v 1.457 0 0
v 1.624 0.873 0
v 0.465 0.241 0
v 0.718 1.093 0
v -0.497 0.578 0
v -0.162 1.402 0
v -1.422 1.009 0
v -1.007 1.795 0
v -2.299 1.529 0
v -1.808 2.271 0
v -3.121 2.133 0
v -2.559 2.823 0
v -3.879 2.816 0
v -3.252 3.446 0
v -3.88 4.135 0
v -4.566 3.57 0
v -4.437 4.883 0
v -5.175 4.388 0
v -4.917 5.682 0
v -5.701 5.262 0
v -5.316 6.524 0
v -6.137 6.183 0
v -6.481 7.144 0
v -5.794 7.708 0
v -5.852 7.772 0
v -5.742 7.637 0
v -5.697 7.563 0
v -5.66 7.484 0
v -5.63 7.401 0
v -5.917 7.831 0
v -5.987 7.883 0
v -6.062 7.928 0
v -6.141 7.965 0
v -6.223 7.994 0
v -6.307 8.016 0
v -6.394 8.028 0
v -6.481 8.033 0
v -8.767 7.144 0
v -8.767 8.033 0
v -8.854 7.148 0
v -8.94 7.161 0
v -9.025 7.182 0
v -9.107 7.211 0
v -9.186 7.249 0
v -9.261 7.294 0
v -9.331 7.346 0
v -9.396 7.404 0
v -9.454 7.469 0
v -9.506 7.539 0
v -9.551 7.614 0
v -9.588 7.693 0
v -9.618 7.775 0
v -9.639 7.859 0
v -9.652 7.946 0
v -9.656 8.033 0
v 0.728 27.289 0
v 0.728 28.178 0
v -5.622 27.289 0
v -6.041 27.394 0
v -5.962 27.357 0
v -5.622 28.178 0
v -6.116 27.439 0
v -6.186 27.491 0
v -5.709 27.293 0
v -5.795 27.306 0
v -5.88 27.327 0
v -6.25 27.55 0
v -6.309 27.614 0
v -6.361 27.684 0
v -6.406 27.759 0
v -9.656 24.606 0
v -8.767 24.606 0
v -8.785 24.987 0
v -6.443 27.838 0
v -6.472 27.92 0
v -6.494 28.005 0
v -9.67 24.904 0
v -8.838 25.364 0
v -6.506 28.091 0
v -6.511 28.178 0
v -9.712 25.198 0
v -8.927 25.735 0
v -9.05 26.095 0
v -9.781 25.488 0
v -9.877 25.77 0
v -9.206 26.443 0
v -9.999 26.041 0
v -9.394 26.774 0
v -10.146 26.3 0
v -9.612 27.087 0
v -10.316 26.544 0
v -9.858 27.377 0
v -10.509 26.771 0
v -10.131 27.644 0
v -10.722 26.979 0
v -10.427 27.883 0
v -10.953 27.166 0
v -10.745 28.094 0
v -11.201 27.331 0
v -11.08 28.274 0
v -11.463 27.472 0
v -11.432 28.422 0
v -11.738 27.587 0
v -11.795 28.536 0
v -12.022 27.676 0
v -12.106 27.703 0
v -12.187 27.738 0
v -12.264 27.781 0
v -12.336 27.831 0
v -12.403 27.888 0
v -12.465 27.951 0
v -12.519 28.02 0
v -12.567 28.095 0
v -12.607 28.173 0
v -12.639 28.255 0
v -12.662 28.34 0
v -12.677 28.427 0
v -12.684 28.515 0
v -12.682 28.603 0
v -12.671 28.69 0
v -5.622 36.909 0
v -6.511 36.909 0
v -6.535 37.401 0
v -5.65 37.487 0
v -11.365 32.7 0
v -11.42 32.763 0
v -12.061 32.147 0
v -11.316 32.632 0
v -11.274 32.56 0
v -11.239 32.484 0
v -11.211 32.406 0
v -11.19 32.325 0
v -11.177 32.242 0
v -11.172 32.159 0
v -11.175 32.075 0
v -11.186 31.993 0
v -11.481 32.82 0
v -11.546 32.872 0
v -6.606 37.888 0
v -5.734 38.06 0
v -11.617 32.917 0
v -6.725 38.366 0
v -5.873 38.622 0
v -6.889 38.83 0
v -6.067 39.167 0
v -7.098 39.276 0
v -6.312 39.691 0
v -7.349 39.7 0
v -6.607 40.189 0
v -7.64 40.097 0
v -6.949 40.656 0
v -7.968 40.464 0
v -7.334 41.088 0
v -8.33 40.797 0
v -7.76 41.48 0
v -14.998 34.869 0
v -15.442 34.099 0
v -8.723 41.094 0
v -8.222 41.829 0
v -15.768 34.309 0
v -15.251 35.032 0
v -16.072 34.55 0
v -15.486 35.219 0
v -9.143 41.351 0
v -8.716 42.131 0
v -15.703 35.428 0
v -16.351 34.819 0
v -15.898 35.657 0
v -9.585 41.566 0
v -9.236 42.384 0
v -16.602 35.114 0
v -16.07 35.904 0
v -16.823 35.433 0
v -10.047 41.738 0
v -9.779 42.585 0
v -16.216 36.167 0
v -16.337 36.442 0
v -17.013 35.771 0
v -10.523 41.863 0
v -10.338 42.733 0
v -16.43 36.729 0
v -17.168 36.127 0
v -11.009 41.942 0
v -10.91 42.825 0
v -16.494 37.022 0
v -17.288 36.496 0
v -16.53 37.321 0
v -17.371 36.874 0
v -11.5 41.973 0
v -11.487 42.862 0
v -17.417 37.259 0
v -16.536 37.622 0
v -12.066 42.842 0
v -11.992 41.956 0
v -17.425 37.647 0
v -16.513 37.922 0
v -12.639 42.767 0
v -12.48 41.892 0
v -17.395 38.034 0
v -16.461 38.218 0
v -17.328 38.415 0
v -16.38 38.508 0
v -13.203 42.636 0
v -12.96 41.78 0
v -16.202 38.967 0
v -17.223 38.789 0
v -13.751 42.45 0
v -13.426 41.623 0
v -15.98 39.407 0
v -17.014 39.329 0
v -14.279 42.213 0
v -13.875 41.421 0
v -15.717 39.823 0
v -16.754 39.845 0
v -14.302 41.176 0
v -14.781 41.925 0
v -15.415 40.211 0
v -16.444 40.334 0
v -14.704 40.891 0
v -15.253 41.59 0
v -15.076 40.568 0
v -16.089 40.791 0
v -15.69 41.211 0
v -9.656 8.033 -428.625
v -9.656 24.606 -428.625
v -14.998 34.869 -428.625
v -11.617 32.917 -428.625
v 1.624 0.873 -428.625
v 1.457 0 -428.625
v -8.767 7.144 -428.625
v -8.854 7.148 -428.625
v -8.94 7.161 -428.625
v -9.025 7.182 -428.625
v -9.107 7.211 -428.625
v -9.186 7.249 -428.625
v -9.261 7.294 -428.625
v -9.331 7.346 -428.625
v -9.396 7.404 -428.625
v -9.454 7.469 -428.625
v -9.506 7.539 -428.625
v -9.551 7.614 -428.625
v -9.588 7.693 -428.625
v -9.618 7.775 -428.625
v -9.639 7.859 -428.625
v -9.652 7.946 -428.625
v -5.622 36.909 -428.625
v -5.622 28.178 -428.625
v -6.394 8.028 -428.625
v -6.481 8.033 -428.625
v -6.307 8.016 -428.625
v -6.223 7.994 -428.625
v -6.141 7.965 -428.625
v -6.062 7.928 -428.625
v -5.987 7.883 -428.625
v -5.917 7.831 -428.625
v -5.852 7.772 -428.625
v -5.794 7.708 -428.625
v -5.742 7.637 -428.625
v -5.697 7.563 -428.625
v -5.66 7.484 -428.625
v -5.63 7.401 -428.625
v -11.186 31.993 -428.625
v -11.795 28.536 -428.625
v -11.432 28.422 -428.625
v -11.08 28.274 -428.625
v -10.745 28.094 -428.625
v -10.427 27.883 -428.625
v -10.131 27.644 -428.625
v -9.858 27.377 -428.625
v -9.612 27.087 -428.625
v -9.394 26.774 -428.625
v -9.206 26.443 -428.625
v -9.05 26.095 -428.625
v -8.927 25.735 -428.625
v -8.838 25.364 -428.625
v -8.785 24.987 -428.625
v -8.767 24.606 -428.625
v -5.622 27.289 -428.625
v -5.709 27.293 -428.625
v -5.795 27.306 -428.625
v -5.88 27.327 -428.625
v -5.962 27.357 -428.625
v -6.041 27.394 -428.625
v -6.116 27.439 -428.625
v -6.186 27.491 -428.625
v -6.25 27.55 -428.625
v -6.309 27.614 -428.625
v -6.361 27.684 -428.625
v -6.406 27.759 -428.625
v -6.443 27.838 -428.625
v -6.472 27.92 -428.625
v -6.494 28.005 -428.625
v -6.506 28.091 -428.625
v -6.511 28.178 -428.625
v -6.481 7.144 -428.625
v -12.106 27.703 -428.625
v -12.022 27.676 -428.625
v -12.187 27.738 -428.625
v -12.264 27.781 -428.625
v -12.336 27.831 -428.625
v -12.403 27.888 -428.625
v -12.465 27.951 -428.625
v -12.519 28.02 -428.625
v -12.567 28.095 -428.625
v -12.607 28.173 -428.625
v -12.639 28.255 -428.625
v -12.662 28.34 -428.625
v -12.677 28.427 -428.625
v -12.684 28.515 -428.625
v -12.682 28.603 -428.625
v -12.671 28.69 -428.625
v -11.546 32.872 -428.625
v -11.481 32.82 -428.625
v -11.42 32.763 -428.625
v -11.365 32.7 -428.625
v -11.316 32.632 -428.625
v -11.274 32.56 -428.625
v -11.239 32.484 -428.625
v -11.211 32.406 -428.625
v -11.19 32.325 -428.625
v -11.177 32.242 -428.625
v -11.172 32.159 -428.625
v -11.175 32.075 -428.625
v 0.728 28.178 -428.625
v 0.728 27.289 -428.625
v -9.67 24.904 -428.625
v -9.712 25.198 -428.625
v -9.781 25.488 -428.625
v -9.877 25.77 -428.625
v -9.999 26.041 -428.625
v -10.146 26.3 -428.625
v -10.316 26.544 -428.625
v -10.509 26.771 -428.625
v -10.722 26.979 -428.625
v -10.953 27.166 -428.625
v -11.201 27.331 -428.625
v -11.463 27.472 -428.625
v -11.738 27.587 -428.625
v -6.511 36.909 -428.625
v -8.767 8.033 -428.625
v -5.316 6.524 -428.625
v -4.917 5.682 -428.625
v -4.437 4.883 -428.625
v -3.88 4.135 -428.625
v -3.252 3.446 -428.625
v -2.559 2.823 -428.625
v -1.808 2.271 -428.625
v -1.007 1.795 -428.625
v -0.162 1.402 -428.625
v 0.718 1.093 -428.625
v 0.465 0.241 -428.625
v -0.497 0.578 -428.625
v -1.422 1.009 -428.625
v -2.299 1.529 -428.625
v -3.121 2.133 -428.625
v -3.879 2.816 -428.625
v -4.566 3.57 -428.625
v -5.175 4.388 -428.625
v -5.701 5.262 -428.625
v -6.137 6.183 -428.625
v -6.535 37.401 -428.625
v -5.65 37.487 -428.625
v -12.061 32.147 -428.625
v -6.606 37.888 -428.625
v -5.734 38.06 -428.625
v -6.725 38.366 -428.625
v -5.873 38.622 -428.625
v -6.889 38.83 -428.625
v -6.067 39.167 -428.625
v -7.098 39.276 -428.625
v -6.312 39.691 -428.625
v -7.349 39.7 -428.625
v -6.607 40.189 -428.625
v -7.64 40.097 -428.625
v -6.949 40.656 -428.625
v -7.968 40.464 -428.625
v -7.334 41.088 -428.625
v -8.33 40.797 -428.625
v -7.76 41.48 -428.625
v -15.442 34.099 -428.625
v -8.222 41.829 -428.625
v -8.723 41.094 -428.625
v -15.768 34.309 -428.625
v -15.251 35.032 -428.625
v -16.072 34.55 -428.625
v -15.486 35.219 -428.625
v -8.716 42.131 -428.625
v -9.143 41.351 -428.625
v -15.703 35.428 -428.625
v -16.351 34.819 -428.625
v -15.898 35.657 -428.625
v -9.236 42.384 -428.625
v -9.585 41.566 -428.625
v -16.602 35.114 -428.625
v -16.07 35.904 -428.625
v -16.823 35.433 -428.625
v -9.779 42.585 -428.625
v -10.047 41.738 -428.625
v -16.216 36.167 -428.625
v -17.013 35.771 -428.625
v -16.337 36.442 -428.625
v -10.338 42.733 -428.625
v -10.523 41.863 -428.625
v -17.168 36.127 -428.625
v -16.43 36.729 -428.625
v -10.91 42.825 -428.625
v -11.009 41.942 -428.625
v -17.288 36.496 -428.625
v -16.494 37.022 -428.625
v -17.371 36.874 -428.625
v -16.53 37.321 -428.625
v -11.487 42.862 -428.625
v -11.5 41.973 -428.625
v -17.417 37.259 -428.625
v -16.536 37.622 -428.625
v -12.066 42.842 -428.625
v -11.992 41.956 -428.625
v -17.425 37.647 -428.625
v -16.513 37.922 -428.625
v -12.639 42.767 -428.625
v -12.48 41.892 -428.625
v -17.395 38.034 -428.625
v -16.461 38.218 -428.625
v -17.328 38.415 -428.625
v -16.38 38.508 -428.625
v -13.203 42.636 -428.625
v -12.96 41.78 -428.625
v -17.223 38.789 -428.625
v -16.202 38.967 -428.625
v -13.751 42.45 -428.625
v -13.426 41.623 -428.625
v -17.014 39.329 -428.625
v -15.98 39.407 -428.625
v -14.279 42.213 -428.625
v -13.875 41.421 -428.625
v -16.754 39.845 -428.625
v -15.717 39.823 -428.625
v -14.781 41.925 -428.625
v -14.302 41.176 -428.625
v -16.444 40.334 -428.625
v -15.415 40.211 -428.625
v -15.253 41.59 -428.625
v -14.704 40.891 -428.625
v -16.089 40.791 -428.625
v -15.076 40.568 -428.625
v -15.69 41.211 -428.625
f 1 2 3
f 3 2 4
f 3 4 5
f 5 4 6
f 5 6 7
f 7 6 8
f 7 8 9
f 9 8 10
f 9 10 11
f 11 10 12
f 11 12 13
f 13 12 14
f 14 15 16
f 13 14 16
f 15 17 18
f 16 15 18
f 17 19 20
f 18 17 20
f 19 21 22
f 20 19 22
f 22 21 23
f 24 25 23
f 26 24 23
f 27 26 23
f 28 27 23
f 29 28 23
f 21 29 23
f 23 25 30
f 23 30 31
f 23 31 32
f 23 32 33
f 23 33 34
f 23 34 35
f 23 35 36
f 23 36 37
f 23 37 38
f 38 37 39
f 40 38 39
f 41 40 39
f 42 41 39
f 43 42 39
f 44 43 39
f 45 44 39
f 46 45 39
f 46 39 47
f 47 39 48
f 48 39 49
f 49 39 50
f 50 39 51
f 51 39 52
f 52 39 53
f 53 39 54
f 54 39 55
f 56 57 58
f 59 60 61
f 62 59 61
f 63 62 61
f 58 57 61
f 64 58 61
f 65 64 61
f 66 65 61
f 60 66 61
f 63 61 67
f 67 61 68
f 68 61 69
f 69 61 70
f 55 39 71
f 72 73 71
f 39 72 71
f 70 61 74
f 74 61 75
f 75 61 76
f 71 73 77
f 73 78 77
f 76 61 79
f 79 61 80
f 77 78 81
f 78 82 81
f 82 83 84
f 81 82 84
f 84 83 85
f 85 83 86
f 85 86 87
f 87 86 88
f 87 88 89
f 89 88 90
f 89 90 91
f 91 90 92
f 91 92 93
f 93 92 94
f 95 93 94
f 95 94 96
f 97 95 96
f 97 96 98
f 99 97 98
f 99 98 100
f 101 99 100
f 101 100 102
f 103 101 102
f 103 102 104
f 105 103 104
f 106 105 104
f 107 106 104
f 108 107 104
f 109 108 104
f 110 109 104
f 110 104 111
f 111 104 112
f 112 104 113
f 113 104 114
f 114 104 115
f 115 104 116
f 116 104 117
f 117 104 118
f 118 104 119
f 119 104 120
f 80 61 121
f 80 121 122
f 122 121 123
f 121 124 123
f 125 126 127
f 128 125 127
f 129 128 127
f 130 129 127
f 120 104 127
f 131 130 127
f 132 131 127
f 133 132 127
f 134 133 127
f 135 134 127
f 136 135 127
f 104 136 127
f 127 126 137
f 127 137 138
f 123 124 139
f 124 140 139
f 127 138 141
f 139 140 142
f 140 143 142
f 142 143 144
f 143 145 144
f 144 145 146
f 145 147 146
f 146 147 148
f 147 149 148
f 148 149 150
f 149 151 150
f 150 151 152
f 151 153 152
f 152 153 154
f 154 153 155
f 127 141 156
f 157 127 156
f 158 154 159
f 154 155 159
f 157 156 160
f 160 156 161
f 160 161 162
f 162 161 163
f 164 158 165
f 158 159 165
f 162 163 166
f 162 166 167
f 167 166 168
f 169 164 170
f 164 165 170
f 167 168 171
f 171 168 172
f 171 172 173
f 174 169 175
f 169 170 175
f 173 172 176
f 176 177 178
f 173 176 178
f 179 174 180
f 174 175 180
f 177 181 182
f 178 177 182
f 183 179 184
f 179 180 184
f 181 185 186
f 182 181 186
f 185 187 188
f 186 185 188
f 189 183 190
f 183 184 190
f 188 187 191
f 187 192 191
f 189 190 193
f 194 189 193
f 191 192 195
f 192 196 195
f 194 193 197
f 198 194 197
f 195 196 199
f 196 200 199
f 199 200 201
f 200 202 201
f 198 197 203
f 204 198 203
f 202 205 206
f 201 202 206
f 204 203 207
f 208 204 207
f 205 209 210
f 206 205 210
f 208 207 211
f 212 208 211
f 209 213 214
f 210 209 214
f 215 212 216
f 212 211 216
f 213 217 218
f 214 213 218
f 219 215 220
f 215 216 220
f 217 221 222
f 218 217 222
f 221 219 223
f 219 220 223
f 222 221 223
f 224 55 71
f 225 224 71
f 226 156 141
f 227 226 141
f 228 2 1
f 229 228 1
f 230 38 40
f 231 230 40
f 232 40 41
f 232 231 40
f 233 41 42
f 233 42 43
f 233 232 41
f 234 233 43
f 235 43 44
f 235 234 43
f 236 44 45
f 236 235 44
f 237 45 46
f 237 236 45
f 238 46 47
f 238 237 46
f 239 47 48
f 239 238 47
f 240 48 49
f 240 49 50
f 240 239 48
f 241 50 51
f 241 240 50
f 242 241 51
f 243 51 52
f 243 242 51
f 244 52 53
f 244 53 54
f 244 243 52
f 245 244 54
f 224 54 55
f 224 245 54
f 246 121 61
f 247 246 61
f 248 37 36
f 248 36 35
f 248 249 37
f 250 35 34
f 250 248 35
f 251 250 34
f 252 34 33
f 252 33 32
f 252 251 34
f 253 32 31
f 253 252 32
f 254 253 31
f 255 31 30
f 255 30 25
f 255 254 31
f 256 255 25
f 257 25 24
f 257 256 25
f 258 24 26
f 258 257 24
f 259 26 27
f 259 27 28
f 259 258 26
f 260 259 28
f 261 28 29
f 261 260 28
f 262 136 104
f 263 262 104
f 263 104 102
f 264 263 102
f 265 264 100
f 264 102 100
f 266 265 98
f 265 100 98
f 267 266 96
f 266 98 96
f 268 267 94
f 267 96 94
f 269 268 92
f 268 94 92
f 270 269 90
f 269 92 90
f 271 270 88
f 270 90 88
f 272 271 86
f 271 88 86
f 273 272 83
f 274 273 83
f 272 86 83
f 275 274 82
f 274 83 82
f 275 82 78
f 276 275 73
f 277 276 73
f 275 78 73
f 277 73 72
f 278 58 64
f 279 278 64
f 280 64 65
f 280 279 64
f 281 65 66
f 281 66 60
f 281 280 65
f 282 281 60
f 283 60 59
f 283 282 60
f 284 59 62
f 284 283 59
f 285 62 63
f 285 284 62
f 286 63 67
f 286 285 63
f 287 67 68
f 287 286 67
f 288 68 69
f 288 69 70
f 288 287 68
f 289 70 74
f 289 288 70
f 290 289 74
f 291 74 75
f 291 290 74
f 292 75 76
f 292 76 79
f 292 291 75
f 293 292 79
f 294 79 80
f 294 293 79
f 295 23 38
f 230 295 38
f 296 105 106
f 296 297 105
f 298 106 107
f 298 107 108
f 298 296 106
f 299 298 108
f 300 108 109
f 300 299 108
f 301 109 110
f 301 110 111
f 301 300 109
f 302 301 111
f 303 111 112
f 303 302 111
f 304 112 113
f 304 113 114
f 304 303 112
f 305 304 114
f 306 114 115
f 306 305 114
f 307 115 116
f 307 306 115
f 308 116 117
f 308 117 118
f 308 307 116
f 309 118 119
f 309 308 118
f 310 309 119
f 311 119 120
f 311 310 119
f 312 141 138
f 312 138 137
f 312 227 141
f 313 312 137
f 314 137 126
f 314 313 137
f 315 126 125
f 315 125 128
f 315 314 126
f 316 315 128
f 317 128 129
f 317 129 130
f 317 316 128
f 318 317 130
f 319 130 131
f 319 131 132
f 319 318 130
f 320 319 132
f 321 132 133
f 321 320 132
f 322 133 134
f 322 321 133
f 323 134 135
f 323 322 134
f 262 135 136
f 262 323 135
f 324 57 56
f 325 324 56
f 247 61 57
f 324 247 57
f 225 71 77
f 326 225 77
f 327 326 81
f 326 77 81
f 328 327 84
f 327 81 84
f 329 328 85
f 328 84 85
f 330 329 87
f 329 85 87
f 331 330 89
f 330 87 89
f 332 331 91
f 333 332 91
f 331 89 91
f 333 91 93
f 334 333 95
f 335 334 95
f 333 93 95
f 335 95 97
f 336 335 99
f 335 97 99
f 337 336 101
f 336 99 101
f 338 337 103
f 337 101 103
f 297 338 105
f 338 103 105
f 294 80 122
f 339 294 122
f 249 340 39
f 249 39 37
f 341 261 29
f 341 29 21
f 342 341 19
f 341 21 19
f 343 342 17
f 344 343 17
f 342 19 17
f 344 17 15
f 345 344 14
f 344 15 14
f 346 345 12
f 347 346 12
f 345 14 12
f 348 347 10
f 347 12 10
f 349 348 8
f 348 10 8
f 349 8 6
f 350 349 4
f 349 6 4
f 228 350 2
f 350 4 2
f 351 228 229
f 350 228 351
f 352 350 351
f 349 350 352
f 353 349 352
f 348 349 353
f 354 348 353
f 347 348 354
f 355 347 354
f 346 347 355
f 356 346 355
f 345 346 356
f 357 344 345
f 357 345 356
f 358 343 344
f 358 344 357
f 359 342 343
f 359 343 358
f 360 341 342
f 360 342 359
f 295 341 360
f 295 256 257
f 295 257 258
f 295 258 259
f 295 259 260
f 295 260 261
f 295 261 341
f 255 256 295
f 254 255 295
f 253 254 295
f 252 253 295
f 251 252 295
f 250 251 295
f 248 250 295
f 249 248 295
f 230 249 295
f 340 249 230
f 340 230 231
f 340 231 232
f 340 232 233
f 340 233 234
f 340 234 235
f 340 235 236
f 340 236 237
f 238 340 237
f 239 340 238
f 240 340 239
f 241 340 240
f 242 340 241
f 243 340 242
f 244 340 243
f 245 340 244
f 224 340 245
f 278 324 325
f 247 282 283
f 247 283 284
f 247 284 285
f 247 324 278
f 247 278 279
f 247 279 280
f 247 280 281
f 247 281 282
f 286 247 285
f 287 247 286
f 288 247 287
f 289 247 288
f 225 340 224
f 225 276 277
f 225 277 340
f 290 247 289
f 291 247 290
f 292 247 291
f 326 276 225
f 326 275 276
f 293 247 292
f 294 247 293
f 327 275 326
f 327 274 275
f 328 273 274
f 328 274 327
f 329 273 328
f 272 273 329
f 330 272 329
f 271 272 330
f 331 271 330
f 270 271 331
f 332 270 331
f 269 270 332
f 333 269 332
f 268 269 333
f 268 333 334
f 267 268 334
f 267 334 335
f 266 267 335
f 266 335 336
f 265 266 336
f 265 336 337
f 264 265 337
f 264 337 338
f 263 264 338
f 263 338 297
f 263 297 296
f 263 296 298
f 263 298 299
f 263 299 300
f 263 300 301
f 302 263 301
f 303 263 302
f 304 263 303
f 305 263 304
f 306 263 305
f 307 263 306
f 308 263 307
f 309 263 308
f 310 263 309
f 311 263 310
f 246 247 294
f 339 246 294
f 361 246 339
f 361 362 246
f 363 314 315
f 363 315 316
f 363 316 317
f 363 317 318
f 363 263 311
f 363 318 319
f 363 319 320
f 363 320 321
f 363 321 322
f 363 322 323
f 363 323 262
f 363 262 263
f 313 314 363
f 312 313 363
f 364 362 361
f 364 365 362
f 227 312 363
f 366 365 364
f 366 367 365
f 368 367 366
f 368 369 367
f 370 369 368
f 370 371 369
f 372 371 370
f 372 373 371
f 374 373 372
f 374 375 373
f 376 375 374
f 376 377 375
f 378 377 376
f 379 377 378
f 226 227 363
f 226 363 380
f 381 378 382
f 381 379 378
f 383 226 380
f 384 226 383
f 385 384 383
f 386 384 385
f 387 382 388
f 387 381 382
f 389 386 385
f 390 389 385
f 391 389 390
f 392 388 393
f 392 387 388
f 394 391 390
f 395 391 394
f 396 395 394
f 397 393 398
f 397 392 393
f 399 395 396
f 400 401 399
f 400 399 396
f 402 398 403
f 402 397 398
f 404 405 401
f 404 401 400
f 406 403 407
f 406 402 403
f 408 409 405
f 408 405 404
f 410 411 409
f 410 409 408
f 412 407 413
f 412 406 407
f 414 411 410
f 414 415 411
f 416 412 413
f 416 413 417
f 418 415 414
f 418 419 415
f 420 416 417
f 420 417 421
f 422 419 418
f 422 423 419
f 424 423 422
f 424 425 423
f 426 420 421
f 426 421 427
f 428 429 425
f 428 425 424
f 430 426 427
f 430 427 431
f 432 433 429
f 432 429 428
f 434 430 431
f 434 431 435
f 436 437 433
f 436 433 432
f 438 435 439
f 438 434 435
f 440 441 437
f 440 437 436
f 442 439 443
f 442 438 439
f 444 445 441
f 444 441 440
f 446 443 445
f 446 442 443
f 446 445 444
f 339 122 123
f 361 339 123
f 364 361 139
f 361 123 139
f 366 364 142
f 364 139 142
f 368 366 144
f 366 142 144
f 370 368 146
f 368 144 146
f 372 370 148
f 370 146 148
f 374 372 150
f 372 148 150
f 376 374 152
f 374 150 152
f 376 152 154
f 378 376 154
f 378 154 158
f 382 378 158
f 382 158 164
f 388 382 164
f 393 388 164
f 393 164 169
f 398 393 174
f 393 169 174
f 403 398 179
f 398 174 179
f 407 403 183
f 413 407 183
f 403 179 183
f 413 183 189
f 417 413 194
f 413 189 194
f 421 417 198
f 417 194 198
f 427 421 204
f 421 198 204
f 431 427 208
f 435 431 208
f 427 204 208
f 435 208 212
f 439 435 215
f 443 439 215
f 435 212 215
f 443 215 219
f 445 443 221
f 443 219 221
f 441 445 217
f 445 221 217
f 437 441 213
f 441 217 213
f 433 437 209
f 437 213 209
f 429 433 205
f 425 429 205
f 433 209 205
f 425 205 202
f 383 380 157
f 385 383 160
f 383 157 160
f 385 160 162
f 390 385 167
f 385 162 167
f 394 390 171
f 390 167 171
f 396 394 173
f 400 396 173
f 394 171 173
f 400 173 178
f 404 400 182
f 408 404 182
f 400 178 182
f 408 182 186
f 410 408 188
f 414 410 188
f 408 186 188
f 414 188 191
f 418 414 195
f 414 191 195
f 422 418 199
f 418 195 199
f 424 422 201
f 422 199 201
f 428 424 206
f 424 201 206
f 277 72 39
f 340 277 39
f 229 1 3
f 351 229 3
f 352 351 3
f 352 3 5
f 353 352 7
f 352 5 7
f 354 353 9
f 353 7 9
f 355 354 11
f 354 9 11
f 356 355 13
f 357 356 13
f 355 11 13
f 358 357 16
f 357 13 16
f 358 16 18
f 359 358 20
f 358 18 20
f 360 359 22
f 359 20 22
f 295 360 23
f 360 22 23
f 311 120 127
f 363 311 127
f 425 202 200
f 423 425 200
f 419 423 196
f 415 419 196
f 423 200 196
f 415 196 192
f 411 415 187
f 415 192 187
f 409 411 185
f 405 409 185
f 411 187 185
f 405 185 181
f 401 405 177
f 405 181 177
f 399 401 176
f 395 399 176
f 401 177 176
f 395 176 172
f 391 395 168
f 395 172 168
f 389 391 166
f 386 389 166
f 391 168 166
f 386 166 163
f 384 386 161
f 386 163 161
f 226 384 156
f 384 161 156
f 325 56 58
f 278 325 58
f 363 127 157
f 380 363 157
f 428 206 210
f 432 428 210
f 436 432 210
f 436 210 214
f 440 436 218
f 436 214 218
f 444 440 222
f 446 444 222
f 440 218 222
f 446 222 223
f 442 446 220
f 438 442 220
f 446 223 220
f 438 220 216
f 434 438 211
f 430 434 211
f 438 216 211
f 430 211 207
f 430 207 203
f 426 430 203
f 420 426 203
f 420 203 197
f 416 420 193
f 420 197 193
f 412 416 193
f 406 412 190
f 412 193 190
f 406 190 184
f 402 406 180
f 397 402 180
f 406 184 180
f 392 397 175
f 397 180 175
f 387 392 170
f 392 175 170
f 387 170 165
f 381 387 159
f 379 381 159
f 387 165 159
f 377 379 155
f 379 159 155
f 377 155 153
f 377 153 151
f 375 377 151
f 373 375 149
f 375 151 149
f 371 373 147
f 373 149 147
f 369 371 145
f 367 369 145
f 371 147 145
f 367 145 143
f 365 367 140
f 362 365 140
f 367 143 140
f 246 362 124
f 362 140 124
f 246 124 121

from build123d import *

# Parameters (mm, degrees)
EXTRUDE_THIN1_DEPTH = 428.625
FILLET1_R           = 0.889


with BuildPart() as part:
    # Sketch1 → Extrude-Thin1 (new body)
    with BuildSketch(Plane.XY):
        with BuildLine():
            ThreePointArc((0, 0), (4.964730566, 2.465229927), (7.9375, 7.14375))
            Line((7.9375, 7.14375), (11.1125, 7.14375))
            Line((11.1125, 7.14375), (11.1125, 24.60625))
            ThreePointArc((11.1125, 24.60625), (12.04243597, 26.85131403), (14.2875, 27.78125))
            Line((14.2875, 27.78125), (13.517722525, 32.146875))
            Line((13.517722525, 32.146875), (16.898645987, 34.098852071))
            ThreePointArc((16.898645987, 34.098852071), (18.624416275, 36.126706761), (18.680023291, 38.788921177))
            ThreePointArc((18.680023291, 38.788921177), (12.079369103, 42.78588283), (7.078269835, 36.909375))
            Line((7.078269835, 36.909375), (7.078269835, 28.178125))
            Line((7.078269835, 28.178125), (0.728269835, 28.178125))
            Line((0.728269835, 28.178125), (0.728269835, 27.289125))
            Line((0.728269835, 27.289125), (7.967269835, 27.289125))
            Line((7.967269835, 27.289125), (7.967269835, 36.909375))
            ThreePointArc((7.967269835, 36.909375), (12.221538279, 41.908324327), (17.836494775, 38.508242281))
            ThreePointArc((17.836494775, 38.508242281), (17.79334373, 36.442363895), (16.454145987, 34.868748655))
            Line((16.454145987, 34.868748655), (12.534135133, 32.605529333))
            Line((12.534135133, 32.605529333), (13.251696834, 28.536034702))
            ThreePointArc((13.251696834, 28.536034702), (11.068369678, 27.086833796), (10.2235, 24.60625))
            Line((10.2235, 24.60625), (10.2235, 8.03275))
            Line((10.2235, 8.03275), (7.254256557, 8.03275))
            ThreePointArc((7.254256557, 8.03275), (4.608977552, 3.348689722), (-0.166979013, 0.873177536))
            Line((-0.166979013, 0.873177536), (0, 0))
        make_face()
    extrude(amount=-EXTRUDE_THIN1_DEPTH)

    # Fillet1
    fillet1_edges = [part.edges().sort_by_distance(p)[0] for p in [
        (14.2875, 27.78125, -214.3125),
        (11.1125, 7.14375, -214.3125),
        (7.254256557, 8.03275, -214.3125),
        (12.534135133, 32.605529333, -214.3125),
        (7.967269835, 27.289125, -214.3125),
    ]]
    fillet(fillet1_edges, radius=FILLET1_R)


with BuildPart() as body_2:
    # Mirror1: mirrored copy
    add(part.part.mirror(Plane(origin=(0.728269835, 27.289125, -428.625), x_dir=(0, 0, 1), z_dir=(1, 0, 0))))


solid = body_2.part
